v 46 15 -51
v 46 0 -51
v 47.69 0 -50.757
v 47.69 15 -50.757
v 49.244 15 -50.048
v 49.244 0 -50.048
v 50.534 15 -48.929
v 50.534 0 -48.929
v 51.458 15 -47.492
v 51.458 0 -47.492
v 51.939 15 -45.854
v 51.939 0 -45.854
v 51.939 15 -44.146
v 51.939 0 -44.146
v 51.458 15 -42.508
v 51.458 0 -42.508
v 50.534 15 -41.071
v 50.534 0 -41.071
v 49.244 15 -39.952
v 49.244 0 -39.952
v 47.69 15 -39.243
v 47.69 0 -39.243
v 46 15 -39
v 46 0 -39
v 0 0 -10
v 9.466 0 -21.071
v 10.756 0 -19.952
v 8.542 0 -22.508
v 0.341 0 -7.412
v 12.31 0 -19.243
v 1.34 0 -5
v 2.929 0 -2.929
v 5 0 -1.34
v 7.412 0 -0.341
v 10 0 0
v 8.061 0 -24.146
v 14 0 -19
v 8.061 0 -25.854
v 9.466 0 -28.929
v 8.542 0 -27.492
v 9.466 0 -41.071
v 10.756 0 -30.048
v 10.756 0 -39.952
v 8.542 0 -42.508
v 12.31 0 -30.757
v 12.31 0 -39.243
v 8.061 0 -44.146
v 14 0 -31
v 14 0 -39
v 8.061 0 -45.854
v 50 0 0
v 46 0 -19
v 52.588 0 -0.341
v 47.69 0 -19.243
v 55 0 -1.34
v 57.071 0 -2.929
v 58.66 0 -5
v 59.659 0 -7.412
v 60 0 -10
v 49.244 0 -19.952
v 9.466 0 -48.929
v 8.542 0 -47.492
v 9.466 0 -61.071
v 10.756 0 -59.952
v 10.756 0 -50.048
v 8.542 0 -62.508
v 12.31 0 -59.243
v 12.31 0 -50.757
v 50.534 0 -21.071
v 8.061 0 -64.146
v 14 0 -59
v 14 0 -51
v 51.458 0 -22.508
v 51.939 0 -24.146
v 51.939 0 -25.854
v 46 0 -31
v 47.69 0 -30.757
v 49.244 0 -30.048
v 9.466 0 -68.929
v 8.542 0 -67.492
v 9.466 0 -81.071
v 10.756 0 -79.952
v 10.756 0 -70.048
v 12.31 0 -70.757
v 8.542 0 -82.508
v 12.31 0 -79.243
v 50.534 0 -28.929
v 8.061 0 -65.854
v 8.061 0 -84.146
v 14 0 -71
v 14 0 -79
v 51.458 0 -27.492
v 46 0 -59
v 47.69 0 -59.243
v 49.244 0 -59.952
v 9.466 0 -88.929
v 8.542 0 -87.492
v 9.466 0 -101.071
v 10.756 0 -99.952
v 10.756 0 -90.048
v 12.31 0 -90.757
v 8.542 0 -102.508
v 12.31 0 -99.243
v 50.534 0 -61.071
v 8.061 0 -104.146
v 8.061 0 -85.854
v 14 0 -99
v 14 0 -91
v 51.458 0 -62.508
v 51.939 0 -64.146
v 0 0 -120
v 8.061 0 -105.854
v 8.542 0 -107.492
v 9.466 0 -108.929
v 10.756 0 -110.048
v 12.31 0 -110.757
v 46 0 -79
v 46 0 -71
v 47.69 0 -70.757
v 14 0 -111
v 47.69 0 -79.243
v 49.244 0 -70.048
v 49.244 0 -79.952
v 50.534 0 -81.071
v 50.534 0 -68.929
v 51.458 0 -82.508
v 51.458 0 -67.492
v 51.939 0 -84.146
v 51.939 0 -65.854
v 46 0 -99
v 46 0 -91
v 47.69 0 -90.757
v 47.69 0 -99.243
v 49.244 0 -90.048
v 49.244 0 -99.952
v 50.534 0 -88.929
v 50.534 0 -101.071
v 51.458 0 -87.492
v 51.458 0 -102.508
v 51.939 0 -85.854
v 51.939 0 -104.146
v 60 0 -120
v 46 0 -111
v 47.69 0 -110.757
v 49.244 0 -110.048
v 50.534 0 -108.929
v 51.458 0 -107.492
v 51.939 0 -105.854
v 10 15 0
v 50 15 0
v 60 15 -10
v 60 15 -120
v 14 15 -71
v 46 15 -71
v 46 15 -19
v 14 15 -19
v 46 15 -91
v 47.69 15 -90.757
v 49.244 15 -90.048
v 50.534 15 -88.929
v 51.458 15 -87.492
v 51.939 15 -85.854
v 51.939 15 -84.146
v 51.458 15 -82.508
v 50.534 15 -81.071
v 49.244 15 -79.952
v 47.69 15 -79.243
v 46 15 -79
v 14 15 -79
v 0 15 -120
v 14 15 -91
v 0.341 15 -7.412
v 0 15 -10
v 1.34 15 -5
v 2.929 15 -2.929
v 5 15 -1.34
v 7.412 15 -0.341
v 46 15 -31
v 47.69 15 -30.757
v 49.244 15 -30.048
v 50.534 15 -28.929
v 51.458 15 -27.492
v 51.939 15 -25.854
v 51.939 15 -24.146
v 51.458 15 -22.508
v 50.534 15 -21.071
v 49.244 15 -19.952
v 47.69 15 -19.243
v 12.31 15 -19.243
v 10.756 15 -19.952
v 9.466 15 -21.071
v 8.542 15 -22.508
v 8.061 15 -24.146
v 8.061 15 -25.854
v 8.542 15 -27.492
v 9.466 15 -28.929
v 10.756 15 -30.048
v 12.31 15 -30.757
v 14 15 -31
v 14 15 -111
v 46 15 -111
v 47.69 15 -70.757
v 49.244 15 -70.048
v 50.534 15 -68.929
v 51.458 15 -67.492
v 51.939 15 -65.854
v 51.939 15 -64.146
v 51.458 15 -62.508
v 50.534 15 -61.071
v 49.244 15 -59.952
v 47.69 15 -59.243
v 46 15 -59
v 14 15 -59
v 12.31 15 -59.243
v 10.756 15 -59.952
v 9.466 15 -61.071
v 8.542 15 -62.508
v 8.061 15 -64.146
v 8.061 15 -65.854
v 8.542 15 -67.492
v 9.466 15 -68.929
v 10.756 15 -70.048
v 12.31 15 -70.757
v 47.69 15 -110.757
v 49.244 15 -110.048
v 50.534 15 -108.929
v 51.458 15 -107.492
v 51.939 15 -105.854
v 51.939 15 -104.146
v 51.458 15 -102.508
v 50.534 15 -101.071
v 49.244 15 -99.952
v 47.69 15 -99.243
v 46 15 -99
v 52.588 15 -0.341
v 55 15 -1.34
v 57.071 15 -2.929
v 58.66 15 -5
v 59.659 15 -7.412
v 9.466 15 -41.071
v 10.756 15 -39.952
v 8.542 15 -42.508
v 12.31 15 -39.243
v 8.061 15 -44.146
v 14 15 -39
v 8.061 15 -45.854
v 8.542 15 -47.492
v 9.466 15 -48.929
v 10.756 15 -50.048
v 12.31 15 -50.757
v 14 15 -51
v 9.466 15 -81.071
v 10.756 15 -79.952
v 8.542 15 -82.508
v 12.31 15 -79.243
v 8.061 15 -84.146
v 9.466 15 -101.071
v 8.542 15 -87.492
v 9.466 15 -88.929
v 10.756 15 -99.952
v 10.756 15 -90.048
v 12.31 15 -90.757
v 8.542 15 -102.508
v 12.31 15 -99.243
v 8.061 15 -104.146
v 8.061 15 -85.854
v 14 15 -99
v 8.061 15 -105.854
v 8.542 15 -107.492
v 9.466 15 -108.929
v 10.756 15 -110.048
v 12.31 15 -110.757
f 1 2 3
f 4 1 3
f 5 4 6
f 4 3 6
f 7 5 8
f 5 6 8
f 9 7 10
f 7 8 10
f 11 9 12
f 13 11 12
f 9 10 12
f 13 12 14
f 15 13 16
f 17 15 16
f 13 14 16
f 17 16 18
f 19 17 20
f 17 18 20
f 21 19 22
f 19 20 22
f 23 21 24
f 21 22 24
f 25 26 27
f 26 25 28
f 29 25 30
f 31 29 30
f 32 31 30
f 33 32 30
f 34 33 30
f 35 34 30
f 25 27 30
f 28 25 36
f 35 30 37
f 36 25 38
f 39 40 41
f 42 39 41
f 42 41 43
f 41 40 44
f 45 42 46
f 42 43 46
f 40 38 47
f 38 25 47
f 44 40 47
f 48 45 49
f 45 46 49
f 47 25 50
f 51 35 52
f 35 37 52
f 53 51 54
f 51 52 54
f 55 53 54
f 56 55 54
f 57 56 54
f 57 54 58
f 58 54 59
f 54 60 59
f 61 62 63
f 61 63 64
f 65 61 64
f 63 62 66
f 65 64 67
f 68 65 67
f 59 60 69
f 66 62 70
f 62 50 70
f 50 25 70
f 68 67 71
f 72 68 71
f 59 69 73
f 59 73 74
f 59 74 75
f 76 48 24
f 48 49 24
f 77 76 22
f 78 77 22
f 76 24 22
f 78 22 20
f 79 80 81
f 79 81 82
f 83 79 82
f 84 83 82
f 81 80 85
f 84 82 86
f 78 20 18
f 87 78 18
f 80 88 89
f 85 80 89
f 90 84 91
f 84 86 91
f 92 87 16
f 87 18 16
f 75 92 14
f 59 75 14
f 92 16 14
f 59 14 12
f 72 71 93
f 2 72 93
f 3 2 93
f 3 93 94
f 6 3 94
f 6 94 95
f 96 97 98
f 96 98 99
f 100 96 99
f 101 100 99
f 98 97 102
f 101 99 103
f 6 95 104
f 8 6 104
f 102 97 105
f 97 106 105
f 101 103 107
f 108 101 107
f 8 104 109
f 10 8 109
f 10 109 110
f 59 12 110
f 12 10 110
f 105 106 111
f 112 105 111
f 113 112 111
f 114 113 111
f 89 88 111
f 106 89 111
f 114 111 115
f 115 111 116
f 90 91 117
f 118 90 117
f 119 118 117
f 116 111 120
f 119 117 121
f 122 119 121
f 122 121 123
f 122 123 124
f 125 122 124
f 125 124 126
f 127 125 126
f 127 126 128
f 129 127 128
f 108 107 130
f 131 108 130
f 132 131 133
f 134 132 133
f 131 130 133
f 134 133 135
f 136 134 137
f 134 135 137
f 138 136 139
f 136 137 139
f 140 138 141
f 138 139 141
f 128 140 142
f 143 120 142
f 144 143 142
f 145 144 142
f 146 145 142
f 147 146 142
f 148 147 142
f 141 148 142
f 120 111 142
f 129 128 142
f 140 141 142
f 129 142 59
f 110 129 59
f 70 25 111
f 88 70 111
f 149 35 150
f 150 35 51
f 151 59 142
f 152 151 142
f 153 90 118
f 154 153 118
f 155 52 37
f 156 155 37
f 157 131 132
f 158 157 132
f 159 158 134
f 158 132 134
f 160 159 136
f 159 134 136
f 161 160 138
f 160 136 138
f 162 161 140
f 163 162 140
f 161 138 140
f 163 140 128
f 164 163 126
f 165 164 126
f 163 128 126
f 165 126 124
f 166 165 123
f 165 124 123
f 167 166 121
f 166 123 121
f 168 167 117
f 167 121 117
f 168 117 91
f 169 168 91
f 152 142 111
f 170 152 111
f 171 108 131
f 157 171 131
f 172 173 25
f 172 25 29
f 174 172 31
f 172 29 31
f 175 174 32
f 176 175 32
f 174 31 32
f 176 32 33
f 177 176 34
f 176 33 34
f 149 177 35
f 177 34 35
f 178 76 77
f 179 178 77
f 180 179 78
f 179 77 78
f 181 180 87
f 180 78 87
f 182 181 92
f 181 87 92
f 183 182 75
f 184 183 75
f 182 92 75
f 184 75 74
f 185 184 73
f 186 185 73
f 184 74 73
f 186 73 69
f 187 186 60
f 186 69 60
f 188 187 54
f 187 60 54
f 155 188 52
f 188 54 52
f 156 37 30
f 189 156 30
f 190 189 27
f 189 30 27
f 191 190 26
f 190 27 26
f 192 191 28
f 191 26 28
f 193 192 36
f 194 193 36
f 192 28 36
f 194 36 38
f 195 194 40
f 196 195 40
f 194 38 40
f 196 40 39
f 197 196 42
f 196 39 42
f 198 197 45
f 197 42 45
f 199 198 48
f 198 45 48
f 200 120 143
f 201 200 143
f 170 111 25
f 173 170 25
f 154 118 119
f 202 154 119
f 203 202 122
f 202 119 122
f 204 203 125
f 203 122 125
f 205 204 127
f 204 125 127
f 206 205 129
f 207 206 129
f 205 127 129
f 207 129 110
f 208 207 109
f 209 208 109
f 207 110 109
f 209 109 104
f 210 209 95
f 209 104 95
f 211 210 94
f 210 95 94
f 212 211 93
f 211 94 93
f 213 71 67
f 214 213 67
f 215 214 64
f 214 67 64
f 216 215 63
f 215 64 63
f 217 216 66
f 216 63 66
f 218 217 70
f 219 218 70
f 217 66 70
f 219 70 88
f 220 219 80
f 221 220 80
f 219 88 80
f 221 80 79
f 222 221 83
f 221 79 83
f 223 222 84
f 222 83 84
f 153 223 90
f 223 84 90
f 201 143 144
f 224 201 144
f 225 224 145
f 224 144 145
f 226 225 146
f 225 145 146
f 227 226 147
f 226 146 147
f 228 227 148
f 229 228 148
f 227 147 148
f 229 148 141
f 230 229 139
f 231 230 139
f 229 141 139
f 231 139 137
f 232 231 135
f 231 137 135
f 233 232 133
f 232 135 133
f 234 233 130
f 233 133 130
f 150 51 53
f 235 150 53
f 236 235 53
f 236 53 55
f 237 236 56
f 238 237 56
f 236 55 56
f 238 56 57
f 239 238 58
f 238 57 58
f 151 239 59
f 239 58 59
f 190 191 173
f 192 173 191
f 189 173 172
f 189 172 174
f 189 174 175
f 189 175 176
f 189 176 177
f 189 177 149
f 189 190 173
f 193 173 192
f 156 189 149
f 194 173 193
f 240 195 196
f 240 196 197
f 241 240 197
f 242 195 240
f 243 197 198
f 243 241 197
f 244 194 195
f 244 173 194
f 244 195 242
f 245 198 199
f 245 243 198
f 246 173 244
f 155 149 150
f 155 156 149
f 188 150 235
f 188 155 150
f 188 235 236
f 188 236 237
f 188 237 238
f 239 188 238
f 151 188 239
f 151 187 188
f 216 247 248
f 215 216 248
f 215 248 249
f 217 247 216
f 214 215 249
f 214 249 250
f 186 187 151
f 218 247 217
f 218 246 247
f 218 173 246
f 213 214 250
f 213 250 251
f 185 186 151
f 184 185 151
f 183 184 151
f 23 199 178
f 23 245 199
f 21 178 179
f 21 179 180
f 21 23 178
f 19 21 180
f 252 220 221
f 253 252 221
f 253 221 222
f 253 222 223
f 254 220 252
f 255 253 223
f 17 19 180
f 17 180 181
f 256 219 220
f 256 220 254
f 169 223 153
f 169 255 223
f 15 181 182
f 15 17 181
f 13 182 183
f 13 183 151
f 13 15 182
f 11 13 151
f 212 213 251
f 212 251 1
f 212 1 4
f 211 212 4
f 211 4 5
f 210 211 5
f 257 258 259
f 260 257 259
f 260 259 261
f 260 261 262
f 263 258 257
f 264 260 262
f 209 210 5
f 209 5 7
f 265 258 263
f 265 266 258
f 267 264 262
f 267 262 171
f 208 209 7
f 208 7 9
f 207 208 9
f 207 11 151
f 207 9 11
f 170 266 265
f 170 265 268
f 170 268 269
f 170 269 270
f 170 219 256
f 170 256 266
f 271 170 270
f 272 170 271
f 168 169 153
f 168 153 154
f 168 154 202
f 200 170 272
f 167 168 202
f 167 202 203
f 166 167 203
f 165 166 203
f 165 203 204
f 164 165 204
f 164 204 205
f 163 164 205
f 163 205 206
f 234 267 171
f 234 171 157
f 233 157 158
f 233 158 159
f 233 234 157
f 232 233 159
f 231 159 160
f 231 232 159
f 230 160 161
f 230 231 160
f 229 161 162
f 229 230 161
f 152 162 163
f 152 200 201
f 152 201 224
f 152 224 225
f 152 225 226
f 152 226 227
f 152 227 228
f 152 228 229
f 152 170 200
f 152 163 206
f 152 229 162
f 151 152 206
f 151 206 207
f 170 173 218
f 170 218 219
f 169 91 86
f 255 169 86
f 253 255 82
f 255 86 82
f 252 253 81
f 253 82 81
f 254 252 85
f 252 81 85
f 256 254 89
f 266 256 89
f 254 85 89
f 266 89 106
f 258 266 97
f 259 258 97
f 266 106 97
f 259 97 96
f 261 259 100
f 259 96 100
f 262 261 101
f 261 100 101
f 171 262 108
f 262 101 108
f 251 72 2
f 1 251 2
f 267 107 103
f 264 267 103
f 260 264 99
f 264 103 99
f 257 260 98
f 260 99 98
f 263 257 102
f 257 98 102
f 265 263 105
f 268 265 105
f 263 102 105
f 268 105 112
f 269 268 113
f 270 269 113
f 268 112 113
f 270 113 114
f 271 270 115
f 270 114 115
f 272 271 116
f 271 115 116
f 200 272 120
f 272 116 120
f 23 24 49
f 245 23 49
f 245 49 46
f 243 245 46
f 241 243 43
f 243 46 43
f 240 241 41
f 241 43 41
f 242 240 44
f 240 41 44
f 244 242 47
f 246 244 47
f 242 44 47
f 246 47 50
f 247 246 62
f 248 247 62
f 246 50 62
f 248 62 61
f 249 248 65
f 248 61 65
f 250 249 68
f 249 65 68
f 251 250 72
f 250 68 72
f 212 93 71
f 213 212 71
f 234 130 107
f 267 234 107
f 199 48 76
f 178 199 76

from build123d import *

# Parameters (mm, degrees)
EXTRUDE_1_DEPTH = 15


with BuildPart() as part:
    # Эскиз1 → Бобышка-Вытянуть1 (new body)
    with BuildSketch(Plane(origin=(0, 0, 0), x_dir=(1, 0, 0), z_dir=(0, 1, 0))):
        with BuildLine():
            Line((10, 0), (50, 0))
            ThreePointArc((50, 0), (57.071067812, 2.928932188), (60, 10))
            Line((60, 10), (60, 120))
            Line((60, 120), (0, 120))
            Line((0, 120), (0, 10))
            ThreePointArc((0, 10), (2.928932188, 2.928932188), (10, 0))
        make_face()
        with BuildLine():
            Line((14, 111), (46, 111))
            ThreePointArc((46, 111), (52, 105), (46, 99))
            Line((46, 99), (14, 99))
            ThreePointArc((14, 99), (8, 105), (14, 111))
        make_face(mode=Mode.SUBTRACT)
        with BuildLine():
            Line((14, 91), (46, 91))
            ThreePointArc((46, 91), (52, 85), (46, 79))
            Line((46, 79), (14, 79))
            ThreePointArc((14, 79), (8, 85), (14, 91))
        make_face(mode=Mode.SUBTRACT)
        with BuildLine():
            Line((14, 71), (46, 71))
            ThreePointArc((46, 71), (52, 65), (46, 59))
            Line((46, 59), (14, 59))
            ThreePointArc((14, 59), (8, 65), (14, 71))
        make_face(mode=Mode.SUBTRACT)
        with BuildLine():
            Line((14, 51), (46, 51))
            ThreePointArc((46, 51), (52, 45), (46, 39))
            Line((46, 39), (14, 39))
            ThreePointArc((14, 39), (8, 45), (14, 51))
        make_face(mode=Mode.SUBTRACT)
        with BuildLine():
            Line((14, 31), (46, 31))
            ThreePointArc((46, 31), (52, 25), (46, 19))
            Line((46, 19), (14, 19))
            ThreePointArc((14, 19), (8, 25), (14, 31))
        make_face(mode=Mode.SUBTRACT)
    extrude(amount=EXTRUDE_1_DEPTH)


solid = part.part
